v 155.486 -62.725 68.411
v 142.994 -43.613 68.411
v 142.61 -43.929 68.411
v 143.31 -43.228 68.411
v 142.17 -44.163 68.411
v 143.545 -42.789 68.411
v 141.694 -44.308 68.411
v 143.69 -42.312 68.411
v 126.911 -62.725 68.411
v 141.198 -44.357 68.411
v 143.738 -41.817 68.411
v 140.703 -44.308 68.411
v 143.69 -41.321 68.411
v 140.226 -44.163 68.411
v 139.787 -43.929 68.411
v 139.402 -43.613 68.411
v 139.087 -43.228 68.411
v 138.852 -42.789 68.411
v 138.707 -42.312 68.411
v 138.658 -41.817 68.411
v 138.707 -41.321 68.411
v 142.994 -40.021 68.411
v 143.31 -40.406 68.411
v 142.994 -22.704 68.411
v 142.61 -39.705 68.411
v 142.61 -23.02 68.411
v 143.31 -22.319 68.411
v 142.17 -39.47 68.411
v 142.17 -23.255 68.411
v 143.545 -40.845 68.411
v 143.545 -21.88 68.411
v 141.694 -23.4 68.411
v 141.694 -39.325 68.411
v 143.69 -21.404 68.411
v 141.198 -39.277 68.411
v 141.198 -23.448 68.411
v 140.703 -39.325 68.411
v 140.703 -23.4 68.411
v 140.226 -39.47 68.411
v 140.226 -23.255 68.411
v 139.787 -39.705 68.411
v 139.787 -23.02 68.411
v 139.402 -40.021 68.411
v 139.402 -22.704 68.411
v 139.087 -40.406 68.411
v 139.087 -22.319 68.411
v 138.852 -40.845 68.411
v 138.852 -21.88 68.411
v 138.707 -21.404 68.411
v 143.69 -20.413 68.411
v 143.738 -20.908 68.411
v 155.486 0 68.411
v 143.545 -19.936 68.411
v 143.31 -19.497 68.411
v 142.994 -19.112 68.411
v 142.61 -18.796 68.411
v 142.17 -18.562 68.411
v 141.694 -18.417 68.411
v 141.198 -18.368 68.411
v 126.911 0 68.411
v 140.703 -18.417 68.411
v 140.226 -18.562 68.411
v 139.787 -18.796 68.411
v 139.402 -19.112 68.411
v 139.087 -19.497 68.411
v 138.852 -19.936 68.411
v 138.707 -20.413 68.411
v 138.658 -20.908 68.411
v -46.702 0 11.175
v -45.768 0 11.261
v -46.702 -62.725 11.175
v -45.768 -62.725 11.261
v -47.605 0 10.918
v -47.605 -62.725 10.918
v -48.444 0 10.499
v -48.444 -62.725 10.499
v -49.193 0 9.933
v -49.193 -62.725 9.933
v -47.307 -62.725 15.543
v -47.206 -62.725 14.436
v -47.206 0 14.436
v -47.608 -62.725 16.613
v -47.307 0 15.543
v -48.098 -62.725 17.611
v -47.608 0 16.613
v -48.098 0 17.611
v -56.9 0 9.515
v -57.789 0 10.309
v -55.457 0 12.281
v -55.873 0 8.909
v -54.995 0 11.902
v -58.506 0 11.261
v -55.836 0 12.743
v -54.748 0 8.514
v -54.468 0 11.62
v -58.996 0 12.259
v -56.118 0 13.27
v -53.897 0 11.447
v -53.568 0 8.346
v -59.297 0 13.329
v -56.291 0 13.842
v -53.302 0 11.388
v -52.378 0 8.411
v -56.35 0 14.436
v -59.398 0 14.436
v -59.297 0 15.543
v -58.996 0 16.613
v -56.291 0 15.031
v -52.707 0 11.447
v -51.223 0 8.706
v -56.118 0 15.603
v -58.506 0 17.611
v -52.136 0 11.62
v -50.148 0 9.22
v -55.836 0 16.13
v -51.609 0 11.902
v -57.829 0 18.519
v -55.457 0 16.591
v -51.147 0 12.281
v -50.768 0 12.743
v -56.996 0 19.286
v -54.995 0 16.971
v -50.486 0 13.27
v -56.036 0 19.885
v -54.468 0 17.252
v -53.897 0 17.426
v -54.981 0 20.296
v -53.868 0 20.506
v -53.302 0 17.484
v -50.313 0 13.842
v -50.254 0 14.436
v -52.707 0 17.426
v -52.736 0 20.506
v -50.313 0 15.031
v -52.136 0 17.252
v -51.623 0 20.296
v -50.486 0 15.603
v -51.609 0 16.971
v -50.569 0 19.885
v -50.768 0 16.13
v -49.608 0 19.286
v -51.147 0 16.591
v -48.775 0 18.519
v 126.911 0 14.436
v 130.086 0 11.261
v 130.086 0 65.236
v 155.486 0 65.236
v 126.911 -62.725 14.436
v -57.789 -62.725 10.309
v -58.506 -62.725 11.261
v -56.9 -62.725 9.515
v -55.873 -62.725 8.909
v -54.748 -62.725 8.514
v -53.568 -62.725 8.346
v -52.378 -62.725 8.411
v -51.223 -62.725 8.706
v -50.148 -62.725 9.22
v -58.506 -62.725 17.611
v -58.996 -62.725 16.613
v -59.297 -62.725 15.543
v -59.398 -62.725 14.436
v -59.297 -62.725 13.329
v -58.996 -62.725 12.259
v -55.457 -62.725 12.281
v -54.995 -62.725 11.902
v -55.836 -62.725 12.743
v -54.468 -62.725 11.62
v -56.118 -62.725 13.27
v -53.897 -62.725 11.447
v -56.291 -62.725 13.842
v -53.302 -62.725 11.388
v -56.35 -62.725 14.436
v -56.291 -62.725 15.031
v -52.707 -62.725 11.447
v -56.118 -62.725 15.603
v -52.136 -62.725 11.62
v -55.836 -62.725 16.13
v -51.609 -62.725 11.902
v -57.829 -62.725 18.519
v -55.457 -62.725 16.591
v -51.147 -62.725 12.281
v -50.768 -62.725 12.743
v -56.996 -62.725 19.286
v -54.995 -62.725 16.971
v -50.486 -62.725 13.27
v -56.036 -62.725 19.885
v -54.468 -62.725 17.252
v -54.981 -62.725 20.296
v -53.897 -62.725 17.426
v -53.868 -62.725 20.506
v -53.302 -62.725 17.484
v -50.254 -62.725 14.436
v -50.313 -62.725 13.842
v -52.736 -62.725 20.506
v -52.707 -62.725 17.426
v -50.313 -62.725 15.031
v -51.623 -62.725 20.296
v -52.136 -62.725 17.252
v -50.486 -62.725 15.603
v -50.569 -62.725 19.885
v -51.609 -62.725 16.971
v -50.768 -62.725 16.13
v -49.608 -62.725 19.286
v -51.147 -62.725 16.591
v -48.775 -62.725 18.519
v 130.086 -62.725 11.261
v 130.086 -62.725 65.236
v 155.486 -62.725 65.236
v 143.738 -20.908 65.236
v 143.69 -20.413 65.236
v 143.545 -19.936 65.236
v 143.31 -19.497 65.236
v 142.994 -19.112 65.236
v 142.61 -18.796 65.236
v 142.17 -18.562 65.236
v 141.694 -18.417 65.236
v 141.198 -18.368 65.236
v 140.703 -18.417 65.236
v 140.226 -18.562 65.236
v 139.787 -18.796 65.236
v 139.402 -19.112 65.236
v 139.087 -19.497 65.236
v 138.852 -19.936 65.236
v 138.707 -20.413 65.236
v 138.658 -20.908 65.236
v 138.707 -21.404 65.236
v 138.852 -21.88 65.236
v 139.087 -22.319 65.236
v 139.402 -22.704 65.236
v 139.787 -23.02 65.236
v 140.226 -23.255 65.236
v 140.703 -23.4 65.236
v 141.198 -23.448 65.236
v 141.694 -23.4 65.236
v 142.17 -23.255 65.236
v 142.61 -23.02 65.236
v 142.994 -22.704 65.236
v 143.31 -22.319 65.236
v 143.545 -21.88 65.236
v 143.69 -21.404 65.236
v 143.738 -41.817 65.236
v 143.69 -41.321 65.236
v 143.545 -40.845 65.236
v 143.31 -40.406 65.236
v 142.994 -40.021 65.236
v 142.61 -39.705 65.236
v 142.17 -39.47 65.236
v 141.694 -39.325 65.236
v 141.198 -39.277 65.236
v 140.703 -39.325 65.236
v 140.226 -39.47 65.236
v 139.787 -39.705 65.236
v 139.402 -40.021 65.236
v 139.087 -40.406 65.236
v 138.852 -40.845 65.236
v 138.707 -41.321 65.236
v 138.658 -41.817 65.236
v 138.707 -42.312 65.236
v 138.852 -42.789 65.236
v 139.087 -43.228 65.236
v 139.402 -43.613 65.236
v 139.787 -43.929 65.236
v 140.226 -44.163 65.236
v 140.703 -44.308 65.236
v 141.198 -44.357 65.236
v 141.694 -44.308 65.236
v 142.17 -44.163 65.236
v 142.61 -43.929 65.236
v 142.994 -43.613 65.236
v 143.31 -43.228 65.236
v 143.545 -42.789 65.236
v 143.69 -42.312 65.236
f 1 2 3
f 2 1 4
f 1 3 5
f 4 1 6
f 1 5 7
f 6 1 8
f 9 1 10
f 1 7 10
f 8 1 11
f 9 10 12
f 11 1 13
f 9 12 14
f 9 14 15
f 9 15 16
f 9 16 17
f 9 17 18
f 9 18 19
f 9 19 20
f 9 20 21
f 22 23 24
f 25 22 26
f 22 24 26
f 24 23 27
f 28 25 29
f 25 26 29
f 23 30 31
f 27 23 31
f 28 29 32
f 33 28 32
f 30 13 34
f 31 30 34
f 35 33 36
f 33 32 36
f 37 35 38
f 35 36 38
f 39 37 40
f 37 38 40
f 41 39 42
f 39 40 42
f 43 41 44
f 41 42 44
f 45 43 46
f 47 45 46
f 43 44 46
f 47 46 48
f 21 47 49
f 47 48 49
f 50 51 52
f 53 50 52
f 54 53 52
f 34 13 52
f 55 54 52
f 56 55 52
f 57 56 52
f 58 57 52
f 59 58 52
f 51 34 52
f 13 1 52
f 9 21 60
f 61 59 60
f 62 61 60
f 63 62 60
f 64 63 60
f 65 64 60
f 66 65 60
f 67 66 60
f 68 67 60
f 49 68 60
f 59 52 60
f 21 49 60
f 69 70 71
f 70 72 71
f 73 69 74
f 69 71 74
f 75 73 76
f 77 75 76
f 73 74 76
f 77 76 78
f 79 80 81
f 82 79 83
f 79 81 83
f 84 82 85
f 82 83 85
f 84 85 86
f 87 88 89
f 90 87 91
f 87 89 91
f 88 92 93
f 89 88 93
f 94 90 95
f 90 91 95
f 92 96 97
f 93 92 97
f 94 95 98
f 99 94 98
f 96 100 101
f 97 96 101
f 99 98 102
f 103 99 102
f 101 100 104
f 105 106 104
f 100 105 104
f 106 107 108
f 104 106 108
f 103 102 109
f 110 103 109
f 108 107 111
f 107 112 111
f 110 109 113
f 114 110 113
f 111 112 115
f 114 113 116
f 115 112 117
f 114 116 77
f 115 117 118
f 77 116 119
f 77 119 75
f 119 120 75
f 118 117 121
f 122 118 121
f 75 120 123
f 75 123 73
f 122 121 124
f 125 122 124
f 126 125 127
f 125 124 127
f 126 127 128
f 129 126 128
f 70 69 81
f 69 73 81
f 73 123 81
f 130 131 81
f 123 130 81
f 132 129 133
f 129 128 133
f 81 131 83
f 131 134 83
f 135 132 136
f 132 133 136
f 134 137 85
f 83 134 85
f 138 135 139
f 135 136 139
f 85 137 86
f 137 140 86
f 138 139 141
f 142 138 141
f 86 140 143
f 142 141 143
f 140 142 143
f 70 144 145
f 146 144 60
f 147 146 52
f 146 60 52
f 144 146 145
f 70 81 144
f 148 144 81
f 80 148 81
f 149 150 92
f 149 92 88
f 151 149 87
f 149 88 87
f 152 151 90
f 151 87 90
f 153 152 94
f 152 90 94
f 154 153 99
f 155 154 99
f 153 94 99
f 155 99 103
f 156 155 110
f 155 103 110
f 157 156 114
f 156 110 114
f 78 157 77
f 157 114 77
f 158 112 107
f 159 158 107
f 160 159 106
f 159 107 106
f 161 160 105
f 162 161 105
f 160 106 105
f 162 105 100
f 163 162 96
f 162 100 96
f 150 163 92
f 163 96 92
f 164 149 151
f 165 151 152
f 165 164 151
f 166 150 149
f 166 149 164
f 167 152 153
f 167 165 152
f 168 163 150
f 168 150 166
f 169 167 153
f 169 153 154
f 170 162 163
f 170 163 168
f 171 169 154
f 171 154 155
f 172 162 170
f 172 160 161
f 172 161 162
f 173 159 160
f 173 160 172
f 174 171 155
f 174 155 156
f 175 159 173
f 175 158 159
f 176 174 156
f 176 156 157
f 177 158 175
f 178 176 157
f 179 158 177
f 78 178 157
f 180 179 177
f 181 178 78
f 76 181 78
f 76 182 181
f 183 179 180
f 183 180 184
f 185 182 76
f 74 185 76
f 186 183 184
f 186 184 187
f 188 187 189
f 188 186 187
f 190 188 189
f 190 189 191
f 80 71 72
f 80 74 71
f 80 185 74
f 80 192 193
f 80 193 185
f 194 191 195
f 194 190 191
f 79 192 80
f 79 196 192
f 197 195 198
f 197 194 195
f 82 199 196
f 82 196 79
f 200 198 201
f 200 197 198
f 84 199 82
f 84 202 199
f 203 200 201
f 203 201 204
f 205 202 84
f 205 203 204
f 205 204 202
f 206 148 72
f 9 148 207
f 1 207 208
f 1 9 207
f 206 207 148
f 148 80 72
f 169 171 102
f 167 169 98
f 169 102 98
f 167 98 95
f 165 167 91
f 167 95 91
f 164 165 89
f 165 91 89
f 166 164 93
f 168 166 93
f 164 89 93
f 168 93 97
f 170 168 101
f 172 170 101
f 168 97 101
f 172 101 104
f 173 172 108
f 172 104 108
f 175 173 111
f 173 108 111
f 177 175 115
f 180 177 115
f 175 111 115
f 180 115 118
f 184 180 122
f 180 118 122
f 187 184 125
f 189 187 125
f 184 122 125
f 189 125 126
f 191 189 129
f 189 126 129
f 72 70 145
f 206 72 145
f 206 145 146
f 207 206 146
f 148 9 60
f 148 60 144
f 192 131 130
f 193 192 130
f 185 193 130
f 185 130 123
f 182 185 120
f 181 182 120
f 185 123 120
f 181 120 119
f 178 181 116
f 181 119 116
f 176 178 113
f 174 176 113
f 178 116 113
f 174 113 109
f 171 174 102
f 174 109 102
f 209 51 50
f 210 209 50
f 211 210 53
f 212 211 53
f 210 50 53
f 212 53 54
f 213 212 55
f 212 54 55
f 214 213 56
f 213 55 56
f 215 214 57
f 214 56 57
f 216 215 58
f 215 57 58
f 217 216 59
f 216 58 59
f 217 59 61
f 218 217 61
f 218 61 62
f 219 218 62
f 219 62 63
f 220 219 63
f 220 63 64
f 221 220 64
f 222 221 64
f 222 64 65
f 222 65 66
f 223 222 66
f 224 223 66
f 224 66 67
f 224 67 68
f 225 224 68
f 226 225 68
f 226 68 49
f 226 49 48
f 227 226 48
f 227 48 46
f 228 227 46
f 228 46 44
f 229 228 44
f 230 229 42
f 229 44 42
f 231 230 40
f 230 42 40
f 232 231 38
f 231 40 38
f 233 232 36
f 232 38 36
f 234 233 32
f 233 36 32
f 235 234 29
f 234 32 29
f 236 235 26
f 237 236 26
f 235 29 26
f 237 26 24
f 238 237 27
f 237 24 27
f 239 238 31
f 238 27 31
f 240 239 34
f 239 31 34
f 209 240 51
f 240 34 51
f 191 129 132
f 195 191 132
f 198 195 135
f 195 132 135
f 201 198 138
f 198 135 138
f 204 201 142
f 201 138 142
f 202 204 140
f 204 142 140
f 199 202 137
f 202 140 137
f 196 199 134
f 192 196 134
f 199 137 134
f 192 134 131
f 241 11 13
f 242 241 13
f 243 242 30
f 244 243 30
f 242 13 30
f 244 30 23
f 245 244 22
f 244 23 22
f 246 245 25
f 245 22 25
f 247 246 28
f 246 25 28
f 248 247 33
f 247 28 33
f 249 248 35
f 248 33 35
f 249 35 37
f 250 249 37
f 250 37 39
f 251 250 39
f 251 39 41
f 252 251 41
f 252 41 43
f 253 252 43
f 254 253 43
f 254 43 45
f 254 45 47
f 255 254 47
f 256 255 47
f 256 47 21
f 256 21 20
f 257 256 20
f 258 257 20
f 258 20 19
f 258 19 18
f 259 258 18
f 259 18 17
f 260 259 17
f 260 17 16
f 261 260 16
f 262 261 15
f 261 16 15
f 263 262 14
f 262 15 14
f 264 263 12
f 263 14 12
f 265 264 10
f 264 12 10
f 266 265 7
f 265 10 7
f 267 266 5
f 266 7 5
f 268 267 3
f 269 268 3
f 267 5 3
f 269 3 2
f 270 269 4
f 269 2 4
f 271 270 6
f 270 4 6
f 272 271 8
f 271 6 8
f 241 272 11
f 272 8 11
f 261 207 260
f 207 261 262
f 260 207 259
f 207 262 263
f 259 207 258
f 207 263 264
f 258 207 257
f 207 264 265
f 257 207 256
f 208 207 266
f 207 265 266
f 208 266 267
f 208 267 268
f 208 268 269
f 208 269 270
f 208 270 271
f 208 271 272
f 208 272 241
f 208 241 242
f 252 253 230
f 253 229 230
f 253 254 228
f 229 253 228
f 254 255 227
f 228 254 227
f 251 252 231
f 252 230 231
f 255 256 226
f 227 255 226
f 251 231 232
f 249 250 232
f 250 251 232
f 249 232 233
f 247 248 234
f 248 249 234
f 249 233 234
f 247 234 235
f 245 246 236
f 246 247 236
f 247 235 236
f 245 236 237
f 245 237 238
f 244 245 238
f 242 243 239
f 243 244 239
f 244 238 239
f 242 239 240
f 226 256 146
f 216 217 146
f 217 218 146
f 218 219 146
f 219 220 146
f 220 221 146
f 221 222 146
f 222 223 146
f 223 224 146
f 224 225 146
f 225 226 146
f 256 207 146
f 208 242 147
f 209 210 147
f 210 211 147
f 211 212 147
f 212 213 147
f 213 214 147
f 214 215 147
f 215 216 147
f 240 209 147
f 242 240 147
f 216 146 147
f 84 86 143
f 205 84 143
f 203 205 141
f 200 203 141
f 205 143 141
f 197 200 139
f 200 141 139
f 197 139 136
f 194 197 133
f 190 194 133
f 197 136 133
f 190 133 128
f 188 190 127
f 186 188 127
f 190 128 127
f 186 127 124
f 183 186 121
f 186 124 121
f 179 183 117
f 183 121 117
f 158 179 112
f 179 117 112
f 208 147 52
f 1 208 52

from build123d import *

# Parameters (mm, degrees)
F0_W     = 3.175
F0_H     = 3.175
F0_W_2   = 25.4
F1_DEPTH = 62.7250036666
F2_R     = 5.08
F3_R     = 2.54
F4_DEPTH = 60.072


with BuildPart() as f1:
    # F0 (on Front) → F1 (new body)
    with BuildSketch(Plane.XZ):
        with BuildLine():
            Line((-47.2060584766, 11.2612042576), (-47.2060584766, 14.4362042576))
            ThreePointArc((-47.2060584766, 14.4362042576), (-47.4333192743, 12.7872299777), (-48.0981569595, 11.2612042576))
            Line((-48.0981569595, 11.2612042576), (-47.2060584766, 11.2612042576))
        make_face()
        Polygon((126.9109415234, 14.4362042576), (-47.2060584766, 14.4362042576), (-47.2060584766, 11.2612042576), (130.0859415234, 11.2612042576), (130.0859415234, 14.4362042576), align=None)
        with BuildLine():
            ThreePointArc((-48.0981569595, 11.2612042576), (-47.4333192743, 12.7872299777), (-47.2060584766, 14.4362042576))
            ThreePointArc((-47.2060584766, 14.4362042576), (-47.4333192743, 16.0851785375), (-48.0981569595, 17.6112042576))
            ThreePointArc((-48.0981569595, 17.6112042576), (-53.3020584766, 20.5322042576), (-58.5059599937, 17.6112042576))
            ThreePointArc((-58.5059599937, 17.6112042576), (-59.3980584766, 14.4362042576), (-58.5059599937, 11.2612042576))
            ThreePointArc((-58.5059599937, 11.2612042576), (-53.3020584766, 8.3402042576), (-48.0981569595, 11.2612042576))
        make_face()
        with BuildLine():
            ThreePointArc((-53.3020584766, 17.4842042576), (-51.1467970075, 16.5914657267), (-50.2540584766, 14.4362042576))
            ThreePointArc((-50.2540584766, 14.4362042576), (-51.1467970075, 12.2809427886), (-53.3020584766, 11.3882042576))
            ThreePointArc((-53.3020584766, 11.3882042576), (-56.3500584766, 14.4362042576), (-53.3020584766, 17.4842042576))
        make_face(mode=Mode.SUBTRACT)
        Polygon((126.9109415234, 68.4112042576), (126.9109415234, 17.6112042576), (130.0859415234, 17.6112042576), (130.0859415234, 65.2362042576), (130.0859415234, 68.4112042576), align=None)
        with Locations((128.4984415234, 16.0237042576)):
            Rectangle(F0_W, F0_H)
        with Locations((142.7859415234, 66.8237042576)):
            Rectangle(F0_W_2, F0_H)
    extrude(amount=F1_DEPTH)

    # F2
    f2_edges = [f1.edges().sort_by_distance(p)[0] for p in [
        (-48.098157, -31.362502, 11.261204),
    ]]
    fillet(f2_edges, radius=F2_R)

    # F3 (on face) → F4 (cut, through all)
    with BuildSketch(Plane.XY.offset(68.4112042576)):
        with Locations((141.1984415234, -20.9083345554)):
            Circle(F3_R)
        with Locations((141.1984415234, -41.8166691112)):
            Circle(F3_R)
    extrude(amount=-F4_DEPTH, mode=Mode.SUBTRACT)


solid = f1.part
